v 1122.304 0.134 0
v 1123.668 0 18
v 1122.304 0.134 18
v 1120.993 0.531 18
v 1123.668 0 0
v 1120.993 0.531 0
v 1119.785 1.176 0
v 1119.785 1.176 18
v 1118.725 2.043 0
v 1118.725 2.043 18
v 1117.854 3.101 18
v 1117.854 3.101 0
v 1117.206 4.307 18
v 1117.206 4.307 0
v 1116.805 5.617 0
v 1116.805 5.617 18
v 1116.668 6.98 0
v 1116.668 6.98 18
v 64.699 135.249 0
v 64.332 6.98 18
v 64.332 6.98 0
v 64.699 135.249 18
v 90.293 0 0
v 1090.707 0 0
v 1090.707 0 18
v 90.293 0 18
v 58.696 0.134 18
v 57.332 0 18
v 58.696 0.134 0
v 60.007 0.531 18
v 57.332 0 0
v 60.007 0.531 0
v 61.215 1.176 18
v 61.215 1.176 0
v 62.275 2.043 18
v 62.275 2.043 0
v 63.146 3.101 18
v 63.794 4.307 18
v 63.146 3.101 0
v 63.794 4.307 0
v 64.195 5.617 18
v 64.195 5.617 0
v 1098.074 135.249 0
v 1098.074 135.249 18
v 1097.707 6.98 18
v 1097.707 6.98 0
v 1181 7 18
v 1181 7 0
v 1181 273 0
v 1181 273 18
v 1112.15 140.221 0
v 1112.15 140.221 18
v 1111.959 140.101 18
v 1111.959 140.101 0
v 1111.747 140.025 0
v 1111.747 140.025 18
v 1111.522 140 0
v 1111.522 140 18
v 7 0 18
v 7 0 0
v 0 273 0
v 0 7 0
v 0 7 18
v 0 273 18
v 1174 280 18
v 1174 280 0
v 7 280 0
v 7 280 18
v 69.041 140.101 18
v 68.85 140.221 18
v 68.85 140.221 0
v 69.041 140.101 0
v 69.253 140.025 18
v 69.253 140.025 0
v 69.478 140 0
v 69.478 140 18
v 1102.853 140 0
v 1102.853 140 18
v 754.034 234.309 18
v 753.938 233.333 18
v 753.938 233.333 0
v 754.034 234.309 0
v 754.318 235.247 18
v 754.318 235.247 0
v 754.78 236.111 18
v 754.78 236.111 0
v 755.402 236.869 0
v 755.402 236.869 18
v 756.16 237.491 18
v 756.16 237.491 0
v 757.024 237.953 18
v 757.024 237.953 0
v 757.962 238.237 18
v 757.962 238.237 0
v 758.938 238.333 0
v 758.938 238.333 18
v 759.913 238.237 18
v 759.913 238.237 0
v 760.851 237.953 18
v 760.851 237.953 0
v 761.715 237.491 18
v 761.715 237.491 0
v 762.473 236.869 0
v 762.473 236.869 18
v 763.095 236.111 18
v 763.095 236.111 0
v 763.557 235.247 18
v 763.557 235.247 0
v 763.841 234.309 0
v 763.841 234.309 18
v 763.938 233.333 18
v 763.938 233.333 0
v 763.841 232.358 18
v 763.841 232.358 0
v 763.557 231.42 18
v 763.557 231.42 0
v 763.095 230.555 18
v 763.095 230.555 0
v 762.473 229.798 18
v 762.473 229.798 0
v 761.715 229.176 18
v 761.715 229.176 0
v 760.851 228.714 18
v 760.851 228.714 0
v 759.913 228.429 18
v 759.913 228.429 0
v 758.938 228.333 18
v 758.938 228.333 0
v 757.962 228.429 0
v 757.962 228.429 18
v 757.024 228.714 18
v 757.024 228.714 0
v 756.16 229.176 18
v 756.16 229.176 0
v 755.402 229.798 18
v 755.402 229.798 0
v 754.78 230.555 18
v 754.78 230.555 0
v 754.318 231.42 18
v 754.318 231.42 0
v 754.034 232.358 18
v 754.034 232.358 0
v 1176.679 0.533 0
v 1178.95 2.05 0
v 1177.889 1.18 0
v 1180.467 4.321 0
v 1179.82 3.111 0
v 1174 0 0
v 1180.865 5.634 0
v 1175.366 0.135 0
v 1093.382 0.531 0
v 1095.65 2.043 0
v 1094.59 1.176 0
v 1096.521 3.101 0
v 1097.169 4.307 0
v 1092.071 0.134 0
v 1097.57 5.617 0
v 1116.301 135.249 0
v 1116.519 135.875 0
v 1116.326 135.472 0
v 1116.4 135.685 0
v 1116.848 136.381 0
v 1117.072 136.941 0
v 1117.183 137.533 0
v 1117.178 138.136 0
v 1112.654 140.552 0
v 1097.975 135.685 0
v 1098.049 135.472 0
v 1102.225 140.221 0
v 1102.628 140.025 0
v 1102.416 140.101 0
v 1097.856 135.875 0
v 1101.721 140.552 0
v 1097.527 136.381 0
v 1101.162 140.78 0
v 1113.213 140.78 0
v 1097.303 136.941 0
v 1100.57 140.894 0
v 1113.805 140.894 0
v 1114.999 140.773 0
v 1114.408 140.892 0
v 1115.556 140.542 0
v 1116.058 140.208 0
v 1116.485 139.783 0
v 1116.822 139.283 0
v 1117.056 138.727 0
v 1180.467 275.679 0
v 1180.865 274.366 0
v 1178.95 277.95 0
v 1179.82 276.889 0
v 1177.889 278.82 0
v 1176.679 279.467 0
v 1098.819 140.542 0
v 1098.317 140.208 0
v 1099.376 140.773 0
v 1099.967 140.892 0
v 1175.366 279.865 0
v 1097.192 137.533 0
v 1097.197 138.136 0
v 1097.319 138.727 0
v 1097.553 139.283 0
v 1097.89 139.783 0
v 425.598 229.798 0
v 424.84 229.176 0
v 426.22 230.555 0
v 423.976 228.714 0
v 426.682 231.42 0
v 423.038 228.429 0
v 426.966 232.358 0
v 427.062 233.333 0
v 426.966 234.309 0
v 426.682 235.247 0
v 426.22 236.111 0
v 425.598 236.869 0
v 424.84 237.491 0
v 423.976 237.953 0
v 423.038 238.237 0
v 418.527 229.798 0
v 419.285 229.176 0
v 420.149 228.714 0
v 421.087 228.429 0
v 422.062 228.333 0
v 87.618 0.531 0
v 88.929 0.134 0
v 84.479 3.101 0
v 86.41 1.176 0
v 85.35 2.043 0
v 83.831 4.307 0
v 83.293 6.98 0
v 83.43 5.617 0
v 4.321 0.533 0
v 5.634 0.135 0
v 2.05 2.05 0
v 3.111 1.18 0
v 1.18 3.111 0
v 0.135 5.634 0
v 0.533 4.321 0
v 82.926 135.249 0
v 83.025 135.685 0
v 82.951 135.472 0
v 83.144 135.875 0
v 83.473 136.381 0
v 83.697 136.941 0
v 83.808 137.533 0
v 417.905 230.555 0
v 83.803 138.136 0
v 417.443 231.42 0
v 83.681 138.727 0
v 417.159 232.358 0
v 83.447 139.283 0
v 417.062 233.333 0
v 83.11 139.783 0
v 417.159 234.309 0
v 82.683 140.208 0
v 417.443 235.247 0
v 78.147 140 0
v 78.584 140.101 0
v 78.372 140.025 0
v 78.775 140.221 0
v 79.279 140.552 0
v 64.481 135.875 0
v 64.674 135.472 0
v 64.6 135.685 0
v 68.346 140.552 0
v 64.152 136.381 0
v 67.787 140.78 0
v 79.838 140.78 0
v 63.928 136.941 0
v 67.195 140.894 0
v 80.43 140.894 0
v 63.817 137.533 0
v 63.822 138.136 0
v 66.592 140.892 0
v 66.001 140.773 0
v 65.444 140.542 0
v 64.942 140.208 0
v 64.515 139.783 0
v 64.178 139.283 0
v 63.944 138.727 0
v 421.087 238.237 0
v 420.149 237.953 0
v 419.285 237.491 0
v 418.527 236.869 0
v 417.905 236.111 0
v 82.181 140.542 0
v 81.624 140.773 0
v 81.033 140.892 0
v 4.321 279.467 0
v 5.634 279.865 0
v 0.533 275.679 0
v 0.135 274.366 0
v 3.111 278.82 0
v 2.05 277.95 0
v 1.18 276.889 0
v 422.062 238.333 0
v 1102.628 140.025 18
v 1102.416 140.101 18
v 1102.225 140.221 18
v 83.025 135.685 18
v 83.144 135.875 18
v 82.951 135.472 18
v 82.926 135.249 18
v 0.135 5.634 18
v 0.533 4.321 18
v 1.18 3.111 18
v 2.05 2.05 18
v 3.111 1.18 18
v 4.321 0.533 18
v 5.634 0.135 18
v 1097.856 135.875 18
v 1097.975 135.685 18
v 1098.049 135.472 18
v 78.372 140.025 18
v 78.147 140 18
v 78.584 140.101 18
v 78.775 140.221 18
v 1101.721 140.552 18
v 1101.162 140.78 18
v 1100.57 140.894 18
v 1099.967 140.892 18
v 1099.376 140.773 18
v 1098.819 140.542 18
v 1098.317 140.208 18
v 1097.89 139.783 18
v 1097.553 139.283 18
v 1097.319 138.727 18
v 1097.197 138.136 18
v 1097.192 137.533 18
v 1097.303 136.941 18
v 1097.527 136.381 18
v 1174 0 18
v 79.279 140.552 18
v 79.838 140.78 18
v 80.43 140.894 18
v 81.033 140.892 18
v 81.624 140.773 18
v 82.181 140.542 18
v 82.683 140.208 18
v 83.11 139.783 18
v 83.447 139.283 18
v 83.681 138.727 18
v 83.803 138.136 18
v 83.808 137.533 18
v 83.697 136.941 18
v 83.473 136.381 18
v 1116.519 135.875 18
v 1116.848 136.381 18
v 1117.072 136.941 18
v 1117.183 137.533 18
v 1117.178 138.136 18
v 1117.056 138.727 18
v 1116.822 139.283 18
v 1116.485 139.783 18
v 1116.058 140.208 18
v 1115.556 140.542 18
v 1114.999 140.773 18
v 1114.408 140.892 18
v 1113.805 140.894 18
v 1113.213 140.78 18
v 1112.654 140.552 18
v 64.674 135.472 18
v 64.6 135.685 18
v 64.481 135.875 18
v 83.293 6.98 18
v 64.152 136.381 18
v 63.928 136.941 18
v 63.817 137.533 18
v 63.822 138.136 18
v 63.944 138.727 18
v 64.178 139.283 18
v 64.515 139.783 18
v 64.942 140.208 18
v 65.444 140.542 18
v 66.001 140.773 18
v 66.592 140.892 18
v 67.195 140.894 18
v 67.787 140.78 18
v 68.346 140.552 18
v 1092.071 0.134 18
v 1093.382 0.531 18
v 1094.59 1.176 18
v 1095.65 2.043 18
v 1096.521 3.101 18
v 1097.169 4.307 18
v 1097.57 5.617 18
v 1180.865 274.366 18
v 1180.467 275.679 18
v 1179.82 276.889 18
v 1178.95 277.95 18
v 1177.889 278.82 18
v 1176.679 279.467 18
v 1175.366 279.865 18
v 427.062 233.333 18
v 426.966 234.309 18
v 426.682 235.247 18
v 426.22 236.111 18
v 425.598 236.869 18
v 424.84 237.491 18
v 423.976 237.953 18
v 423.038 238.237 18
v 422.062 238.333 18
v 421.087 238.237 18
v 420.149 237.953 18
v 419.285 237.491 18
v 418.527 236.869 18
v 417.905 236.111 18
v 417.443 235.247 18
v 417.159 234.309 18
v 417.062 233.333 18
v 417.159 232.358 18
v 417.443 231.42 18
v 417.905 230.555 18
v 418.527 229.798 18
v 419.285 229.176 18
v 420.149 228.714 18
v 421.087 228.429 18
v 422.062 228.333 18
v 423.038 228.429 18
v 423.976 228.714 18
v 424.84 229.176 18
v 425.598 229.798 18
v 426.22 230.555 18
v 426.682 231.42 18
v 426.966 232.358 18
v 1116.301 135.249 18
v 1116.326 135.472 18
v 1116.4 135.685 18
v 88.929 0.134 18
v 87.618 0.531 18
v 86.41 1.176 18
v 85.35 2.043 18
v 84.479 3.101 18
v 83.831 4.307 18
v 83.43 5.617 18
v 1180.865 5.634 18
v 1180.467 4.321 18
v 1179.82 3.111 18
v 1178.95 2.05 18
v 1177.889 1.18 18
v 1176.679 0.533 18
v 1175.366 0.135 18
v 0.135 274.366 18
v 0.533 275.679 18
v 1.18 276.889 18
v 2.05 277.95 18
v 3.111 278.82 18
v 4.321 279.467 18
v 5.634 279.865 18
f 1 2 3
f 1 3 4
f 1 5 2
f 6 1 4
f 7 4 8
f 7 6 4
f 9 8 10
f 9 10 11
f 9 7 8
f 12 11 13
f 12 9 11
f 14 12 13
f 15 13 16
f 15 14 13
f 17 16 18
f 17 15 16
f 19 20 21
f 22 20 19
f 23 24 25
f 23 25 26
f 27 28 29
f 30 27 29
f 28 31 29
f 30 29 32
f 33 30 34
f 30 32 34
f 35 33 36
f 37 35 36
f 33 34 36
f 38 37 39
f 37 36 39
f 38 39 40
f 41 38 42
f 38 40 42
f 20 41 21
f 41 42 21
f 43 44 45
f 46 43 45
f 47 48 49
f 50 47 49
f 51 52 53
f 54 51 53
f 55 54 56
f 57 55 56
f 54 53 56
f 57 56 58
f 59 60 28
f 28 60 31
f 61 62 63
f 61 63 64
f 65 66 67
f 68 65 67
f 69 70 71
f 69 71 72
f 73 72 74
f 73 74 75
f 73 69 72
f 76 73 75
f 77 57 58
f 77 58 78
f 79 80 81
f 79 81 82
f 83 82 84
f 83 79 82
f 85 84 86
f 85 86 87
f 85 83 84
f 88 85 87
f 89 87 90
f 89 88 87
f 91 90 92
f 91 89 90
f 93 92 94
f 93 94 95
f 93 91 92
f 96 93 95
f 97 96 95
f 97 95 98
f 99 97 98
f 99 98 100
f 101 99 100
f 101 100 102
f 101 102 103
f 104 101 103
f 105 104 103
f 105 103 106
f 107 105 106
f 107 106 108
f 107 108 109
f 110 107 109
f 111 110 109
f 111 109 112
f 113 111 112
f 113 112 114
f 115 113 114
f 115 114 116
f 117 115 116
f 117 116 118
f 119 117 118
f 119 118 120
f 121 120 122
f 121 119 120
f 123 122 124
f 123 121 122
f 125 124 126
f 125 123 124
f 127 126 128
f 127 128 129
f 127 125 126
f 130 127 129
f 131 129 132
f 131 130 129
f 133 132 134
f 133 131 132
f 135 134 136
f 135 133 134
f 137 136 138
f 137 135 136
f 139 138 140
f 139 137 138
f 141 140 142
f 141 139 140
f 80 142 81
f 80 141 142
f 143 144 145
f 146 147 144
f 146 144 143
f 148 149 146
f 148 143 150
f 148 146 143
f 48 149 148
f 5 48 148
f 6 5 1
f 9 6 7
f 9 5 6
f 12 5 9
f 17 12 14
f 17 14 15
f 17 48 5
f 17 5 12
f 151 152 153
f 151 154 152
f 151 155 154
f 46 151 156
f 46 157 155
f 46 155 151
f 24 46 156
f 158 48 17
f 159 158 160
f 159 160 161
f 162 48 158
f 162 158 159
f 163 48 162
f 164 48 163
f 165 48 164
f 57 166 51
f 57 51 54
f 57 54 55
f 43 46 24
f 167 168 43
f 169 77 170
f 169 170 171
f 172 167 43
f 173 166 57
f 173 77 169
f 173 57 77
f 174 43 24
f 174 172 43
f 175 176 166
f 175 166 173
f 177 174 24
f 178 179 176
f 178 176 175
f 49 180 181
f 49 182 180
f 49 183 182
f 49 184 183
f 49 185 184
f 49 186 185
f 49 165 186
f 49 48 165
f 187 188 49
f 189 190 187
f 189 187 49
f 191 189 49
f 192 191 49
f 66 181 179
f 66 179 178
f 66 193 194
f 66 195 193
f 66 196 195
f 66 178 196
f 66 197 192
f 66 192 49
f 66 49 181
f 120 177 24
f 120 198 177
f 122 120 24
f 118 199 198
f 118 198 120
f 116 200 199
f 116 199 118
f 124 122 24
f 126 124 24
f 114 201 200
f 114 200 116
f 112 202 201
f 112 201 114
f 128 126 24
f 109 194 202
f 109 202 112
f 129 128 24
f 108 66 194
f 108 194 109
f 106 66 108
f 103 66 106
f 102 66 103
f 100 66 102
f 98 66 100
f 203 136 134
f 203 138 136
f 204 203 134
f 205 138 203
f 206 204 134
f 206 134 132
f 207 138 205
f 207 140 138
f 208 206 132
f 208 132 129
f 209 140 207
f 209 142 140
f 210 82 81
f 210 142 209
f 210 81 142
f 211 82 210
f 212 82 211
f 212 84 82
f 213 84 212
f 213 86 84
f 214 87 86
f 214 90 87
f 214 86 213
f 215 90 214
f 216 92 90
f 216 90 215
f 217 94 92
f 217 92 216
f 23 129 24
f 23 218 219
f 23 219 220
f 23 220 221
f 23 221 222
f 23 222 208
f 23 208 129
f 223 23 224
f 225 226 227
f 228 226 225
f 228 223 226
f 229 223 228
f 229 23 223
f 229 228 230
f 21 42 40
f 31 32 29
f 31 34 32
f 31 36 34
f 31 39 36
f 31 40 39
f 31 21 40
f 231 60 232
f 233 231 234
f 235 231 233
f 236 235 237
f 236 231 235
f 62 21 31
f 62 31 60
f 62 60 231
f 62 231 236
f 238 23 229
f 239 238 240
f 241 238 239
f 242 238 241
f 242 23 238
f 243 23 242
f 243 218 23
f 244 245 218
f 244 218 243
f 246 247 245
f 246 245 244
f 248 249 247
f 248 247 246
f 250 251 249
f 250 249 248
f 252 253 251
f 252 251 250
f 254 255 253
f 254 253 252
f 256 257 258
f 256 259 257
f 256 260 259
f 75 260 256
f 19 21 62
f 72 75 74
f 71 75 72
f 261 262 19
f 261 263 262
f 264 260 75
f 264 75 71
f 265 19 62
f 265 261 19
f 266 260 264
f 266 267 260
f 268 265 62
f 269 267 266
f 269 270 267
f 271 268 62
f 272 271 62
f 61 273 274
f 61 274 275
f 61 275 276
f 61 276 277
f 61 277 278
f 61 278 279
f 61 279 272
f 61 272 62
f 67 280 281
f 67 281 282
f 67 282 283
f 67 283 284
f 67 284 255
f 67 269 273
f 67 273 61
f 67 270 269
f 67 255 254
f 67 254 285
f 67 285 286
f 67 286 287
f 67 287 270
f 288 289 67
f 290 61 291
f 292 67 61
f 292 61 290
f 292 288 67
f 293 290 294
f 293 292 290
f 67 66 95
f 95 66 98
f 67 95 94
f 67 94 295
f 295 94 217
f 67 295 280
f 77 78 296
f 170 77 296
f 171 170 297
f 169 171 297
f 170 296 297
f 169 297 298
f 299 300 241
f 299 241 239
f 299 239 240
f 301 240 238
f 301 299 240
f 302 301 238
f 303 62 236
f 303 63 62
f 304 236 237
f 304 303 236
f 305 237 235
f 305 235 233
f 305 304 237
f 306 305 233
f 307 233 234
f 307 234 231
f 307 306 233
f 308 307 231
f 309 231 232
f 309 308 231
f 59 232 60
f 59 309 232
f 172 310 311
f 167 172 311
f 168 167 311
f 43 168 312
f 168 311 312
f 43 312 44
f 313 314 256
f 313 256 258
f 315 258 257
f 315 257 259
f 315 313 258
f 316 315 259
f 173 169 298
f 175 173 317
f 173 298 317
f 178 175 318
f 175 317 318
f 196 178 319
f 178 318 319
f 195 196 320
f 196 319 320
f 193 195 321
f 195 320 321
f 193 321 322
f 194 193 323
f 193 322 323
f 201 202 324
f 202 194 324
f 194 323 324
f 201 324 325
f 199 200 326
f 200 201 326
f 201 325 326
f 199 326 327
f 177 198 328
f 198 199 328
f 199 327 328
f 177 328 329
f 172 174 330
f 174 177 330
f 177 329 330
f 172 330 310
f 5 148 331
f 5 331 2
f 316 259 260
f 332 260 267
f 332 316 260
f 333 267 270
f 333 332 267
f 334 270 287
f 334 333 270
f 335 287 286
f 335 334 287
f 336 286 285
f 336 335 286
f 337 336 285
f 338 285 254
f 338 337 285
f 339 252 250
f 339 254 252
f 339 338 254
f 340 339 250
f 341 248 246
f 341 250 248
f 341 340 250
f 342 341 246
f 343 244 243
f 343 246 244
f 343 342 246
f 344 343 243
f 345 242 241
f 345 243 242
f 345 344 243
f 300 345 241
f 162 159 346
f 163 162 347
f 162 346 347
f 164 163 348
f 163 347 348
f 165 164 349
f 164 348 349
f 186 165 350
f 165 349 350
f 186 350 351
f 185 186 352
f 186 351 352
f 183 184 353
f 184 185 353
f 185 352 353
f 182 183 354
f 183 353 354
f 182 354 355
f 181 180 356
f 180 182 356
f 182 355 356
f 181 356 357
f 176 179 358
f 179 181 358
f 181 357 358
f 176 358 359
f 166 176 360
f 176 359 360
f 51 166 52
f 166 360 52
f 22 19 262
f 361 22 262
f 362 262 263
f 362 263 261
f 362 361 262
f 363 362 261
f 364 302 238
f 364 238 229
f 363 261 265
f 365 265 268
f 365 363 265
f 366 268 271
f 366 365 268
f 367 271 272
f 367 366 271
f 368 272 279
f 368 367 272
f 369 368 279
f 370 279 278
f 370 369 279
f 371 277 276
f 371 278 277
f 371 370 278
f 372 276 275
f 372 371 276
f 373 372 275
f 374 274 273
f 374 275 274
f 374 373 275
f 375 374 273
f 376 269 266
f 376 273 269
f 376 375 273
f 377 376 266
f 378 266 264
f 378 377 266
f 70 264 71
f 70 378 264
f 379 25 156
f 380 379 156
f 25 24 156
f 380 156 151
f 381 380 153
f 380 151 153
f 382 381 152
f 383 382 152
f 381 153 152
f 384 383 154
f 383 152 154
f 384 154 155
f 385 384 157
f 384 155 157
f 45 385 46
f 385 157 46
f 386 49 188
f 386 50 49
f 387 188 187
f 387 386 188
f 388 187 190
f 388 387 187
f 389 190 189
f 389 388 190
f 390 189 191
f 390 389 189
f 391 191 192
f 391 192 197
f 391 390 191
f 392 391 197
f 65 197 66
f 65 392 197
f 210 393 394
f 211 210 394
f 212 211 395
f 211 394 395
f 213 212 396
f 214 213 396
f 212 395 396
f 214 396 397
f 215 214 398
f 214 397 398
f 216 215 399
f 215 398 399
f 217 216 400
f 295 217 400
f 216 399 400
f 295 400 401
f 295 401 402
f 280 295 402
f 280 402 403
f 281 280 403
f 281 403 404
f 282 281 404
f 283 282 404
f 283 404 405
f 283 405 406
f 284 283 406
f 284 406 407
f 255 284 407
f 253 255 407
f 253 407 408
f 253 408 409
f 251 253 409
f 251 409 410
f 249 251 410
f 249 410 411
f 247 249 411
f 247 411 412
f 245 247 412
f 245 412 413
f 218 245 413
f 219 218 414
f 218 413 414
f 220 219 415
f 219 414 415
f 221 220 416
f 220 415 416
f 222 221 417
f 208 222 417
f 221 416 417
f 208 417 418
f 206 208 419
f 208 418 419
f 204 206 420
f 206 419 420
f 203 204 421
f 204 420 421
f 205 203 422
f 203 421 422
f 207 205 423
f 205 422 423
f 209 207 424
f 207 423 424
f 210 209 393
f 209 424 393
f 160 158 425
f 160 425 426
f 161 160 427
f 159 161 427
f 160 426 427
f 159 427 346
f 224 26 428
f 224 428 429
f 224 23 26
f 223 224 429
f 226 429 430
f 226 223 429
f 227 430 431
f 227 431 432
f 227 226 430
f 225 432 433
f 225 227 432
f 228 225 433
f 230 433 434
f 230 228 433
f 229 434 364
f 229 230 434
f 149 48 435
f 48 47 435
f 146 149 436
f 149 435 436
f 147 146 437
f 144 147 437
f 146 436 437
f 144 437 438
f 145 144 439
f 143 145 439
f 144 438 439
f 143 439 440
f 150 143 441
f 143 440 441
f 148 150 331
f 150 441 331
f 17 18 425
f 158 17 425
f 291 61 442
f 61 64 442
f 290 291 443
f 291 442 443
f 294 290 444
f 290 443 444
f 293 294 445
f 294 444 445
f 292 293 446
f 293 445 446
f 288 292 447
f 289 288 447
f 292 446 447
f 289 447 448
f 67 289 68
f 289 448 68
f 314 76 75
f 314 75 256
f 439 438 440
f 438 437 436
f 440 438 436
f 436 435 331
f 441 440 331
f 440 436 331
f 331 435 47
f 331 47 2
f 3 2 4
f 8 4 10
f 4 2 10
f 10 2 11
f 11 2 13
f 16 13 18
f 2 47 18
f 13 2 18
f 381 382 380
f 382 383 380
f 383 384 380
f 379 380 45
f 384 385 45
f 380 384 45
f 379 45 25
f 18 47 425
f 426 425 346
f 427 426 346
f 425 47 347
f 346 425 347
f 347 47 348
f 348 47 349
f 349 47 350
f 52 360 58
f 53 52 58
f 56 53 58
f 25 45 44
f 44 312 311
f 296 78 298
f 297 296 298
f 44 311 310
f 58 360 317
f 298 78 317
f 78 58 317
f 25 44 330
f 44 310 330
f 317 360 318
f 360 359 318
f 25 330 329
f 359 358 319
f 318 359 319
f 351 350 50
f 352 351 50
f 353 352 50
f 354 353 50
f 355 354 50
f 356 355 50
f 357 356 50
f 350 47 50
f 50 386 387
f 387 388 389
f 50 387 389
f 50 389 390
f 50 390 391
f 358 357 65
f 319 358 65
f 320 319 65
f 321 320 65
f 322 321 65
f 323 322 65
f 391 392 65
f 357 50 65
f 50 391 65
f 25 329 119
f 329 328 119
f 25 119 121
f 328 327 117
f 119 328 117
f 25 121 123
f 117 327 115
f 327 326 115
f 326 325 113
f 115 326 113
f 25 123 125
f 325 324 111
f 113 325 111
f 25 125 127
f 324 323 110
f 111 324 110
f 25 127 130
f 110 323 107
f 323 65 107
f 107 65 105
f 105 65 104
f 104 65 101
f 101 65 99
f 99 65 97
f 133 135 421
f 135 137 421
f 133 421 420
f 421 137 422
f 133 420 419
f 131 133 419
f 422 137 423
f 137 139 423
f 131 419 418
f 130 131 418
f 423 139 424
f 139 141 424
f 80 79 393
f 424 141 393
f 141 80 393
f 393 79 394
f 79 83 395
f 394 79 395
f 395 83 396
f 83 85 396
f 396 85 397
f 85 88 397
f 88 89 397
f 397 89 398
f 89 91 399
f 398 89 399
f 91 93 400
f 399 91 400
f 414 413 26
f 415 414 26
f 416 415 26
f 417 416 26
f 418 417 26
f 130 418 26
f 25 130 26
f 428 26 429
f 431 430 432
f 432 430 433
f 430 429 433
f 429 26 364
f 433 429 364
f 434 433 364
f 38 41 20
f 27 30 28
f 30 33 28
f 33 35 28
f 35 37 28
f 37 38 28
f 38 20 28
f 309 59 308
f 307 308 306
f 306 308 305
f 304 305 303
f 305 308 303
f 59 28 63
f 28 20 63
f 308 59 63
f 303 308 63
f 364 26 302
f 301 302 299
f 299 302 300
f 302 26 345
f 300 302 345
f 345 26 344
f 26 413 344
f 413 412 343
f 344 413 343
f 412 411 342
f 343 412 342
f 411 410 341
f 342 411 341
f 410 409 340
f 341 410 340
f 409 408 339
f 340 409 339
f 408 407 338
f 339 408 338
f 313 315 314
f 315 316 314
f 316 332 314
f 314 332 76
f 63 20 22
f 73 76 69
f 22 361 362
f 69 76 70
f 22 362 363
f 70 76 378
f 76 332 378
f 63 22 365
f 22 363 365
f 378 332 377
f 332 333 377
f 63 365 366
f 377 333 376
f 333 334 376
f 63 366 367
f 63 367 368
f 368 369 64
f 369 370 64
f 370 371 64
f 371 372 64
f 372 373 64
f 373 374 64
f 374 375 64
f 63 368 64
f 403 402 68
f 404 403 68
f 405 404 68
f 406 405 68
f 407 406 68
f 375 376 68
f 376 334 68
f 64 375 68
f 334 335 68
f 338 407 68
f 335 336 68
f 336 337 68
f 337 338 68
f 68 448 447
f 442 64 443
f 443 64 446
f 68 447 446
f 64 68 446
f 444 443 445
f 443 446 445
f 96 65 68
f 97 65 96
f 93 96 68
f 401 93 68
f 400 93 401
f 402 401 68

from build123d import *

# Parameters (mm, degrees)
ESQUISSE1_W         = 590.5
ESQUISSE1_H         = 280
BOSS_EXTRUDE1_DEPTH = 18
CUT_EXTRUDE1_DEPTH  = 654.769263579
ESQUISSE3_R         = 5
CUT_EXTRUDE2_DEPTH  = 654.769263579
CONG_1_R            = 7


with BuildPart() as part:
    # Esquisse1 → Boss-Extrude1 (new body)
    with BuildSketch(Plane.XY):
        with Locations((295.25, 140)):
            Rectangle(ESQUISSE1_W, ESQUISSE1_H)
    extrude(amount=BOSS_EXTRUDE1_DEPTH)

    # Esquisse2 → Cut-Extrude1 (cut, through all)
    with BuildSketch(Plane.XY.offset(18)):
        with BuildLine():
            Line((69.477649355, 140), (78.147350645, 140))
            ThreePointArc((78.147350645, 140), (78.480108702, 140.056987765), (78.774940482, 140.221455848))
            ThreePointArc((78.774940482, 140.221455848), (82.906692971, 140.005791686), (83.14421642, 135.875238181))
            ThreePointArc((83.14421642, 135.875238181), (82.981710298, 135.580689894), (82.926074516, 135.248919502))
            Line((82.926074516, 135.248919502), (83.3125, 0))
            Line((83.3125, 0), (64.3125, 0))
            Line((64.3125, 0), (64.698925484, 135.248919502))
            ThreePointArc((64.698925484, 135.248919502), (64.643289702, 135.580689894), (64.48078358, 135.875238181))
            ThreePointArc((64.48078358, 135.875238181), (64.718307029, 140.005791686), (68.850059518, 140.221455848))
            ThreePointArc((68.850059518, 140.221455848), (69.144891298, 140.056987765), (69.477649355, 140))
        make_face()
    extrude(amount=-CUT_EXTRUDE1_DEPTH, mode=Mode.SUBTRACT)

    # Esquisse3 → Cut-Extrude2 (cut, through all)
    with BuildSketch(Plane.XY.offset(18)):
        with Locations((422.0625, 233.333333333)):
            Circle(ESQUISSE3_R)
    extrude(amount=-CUT_EXTRUDE2_DEPTH, mode=Mode.SUBTRACT)

    # Cong_1
    cong_1_edges = [part.edges().sort_by_distance(p)[0] for p in [
        (83.3125, 0, 9),
        (64.3125, 0, 9),
        (0, 280, 9),
        (0, 0, 9),
    ]]
    fillet(cong_1_edges, radius=CONG_1_R)

    # Sym_trie1: part across plane


with BuildPart() as part_1:
    add(part.part)
    add(part.part.mirror(Plane(origin=(590.5, 0, 18), x_dir=(0, 0, 1), z_dir=(-1, 0, 0))))


solid = part_1.part
